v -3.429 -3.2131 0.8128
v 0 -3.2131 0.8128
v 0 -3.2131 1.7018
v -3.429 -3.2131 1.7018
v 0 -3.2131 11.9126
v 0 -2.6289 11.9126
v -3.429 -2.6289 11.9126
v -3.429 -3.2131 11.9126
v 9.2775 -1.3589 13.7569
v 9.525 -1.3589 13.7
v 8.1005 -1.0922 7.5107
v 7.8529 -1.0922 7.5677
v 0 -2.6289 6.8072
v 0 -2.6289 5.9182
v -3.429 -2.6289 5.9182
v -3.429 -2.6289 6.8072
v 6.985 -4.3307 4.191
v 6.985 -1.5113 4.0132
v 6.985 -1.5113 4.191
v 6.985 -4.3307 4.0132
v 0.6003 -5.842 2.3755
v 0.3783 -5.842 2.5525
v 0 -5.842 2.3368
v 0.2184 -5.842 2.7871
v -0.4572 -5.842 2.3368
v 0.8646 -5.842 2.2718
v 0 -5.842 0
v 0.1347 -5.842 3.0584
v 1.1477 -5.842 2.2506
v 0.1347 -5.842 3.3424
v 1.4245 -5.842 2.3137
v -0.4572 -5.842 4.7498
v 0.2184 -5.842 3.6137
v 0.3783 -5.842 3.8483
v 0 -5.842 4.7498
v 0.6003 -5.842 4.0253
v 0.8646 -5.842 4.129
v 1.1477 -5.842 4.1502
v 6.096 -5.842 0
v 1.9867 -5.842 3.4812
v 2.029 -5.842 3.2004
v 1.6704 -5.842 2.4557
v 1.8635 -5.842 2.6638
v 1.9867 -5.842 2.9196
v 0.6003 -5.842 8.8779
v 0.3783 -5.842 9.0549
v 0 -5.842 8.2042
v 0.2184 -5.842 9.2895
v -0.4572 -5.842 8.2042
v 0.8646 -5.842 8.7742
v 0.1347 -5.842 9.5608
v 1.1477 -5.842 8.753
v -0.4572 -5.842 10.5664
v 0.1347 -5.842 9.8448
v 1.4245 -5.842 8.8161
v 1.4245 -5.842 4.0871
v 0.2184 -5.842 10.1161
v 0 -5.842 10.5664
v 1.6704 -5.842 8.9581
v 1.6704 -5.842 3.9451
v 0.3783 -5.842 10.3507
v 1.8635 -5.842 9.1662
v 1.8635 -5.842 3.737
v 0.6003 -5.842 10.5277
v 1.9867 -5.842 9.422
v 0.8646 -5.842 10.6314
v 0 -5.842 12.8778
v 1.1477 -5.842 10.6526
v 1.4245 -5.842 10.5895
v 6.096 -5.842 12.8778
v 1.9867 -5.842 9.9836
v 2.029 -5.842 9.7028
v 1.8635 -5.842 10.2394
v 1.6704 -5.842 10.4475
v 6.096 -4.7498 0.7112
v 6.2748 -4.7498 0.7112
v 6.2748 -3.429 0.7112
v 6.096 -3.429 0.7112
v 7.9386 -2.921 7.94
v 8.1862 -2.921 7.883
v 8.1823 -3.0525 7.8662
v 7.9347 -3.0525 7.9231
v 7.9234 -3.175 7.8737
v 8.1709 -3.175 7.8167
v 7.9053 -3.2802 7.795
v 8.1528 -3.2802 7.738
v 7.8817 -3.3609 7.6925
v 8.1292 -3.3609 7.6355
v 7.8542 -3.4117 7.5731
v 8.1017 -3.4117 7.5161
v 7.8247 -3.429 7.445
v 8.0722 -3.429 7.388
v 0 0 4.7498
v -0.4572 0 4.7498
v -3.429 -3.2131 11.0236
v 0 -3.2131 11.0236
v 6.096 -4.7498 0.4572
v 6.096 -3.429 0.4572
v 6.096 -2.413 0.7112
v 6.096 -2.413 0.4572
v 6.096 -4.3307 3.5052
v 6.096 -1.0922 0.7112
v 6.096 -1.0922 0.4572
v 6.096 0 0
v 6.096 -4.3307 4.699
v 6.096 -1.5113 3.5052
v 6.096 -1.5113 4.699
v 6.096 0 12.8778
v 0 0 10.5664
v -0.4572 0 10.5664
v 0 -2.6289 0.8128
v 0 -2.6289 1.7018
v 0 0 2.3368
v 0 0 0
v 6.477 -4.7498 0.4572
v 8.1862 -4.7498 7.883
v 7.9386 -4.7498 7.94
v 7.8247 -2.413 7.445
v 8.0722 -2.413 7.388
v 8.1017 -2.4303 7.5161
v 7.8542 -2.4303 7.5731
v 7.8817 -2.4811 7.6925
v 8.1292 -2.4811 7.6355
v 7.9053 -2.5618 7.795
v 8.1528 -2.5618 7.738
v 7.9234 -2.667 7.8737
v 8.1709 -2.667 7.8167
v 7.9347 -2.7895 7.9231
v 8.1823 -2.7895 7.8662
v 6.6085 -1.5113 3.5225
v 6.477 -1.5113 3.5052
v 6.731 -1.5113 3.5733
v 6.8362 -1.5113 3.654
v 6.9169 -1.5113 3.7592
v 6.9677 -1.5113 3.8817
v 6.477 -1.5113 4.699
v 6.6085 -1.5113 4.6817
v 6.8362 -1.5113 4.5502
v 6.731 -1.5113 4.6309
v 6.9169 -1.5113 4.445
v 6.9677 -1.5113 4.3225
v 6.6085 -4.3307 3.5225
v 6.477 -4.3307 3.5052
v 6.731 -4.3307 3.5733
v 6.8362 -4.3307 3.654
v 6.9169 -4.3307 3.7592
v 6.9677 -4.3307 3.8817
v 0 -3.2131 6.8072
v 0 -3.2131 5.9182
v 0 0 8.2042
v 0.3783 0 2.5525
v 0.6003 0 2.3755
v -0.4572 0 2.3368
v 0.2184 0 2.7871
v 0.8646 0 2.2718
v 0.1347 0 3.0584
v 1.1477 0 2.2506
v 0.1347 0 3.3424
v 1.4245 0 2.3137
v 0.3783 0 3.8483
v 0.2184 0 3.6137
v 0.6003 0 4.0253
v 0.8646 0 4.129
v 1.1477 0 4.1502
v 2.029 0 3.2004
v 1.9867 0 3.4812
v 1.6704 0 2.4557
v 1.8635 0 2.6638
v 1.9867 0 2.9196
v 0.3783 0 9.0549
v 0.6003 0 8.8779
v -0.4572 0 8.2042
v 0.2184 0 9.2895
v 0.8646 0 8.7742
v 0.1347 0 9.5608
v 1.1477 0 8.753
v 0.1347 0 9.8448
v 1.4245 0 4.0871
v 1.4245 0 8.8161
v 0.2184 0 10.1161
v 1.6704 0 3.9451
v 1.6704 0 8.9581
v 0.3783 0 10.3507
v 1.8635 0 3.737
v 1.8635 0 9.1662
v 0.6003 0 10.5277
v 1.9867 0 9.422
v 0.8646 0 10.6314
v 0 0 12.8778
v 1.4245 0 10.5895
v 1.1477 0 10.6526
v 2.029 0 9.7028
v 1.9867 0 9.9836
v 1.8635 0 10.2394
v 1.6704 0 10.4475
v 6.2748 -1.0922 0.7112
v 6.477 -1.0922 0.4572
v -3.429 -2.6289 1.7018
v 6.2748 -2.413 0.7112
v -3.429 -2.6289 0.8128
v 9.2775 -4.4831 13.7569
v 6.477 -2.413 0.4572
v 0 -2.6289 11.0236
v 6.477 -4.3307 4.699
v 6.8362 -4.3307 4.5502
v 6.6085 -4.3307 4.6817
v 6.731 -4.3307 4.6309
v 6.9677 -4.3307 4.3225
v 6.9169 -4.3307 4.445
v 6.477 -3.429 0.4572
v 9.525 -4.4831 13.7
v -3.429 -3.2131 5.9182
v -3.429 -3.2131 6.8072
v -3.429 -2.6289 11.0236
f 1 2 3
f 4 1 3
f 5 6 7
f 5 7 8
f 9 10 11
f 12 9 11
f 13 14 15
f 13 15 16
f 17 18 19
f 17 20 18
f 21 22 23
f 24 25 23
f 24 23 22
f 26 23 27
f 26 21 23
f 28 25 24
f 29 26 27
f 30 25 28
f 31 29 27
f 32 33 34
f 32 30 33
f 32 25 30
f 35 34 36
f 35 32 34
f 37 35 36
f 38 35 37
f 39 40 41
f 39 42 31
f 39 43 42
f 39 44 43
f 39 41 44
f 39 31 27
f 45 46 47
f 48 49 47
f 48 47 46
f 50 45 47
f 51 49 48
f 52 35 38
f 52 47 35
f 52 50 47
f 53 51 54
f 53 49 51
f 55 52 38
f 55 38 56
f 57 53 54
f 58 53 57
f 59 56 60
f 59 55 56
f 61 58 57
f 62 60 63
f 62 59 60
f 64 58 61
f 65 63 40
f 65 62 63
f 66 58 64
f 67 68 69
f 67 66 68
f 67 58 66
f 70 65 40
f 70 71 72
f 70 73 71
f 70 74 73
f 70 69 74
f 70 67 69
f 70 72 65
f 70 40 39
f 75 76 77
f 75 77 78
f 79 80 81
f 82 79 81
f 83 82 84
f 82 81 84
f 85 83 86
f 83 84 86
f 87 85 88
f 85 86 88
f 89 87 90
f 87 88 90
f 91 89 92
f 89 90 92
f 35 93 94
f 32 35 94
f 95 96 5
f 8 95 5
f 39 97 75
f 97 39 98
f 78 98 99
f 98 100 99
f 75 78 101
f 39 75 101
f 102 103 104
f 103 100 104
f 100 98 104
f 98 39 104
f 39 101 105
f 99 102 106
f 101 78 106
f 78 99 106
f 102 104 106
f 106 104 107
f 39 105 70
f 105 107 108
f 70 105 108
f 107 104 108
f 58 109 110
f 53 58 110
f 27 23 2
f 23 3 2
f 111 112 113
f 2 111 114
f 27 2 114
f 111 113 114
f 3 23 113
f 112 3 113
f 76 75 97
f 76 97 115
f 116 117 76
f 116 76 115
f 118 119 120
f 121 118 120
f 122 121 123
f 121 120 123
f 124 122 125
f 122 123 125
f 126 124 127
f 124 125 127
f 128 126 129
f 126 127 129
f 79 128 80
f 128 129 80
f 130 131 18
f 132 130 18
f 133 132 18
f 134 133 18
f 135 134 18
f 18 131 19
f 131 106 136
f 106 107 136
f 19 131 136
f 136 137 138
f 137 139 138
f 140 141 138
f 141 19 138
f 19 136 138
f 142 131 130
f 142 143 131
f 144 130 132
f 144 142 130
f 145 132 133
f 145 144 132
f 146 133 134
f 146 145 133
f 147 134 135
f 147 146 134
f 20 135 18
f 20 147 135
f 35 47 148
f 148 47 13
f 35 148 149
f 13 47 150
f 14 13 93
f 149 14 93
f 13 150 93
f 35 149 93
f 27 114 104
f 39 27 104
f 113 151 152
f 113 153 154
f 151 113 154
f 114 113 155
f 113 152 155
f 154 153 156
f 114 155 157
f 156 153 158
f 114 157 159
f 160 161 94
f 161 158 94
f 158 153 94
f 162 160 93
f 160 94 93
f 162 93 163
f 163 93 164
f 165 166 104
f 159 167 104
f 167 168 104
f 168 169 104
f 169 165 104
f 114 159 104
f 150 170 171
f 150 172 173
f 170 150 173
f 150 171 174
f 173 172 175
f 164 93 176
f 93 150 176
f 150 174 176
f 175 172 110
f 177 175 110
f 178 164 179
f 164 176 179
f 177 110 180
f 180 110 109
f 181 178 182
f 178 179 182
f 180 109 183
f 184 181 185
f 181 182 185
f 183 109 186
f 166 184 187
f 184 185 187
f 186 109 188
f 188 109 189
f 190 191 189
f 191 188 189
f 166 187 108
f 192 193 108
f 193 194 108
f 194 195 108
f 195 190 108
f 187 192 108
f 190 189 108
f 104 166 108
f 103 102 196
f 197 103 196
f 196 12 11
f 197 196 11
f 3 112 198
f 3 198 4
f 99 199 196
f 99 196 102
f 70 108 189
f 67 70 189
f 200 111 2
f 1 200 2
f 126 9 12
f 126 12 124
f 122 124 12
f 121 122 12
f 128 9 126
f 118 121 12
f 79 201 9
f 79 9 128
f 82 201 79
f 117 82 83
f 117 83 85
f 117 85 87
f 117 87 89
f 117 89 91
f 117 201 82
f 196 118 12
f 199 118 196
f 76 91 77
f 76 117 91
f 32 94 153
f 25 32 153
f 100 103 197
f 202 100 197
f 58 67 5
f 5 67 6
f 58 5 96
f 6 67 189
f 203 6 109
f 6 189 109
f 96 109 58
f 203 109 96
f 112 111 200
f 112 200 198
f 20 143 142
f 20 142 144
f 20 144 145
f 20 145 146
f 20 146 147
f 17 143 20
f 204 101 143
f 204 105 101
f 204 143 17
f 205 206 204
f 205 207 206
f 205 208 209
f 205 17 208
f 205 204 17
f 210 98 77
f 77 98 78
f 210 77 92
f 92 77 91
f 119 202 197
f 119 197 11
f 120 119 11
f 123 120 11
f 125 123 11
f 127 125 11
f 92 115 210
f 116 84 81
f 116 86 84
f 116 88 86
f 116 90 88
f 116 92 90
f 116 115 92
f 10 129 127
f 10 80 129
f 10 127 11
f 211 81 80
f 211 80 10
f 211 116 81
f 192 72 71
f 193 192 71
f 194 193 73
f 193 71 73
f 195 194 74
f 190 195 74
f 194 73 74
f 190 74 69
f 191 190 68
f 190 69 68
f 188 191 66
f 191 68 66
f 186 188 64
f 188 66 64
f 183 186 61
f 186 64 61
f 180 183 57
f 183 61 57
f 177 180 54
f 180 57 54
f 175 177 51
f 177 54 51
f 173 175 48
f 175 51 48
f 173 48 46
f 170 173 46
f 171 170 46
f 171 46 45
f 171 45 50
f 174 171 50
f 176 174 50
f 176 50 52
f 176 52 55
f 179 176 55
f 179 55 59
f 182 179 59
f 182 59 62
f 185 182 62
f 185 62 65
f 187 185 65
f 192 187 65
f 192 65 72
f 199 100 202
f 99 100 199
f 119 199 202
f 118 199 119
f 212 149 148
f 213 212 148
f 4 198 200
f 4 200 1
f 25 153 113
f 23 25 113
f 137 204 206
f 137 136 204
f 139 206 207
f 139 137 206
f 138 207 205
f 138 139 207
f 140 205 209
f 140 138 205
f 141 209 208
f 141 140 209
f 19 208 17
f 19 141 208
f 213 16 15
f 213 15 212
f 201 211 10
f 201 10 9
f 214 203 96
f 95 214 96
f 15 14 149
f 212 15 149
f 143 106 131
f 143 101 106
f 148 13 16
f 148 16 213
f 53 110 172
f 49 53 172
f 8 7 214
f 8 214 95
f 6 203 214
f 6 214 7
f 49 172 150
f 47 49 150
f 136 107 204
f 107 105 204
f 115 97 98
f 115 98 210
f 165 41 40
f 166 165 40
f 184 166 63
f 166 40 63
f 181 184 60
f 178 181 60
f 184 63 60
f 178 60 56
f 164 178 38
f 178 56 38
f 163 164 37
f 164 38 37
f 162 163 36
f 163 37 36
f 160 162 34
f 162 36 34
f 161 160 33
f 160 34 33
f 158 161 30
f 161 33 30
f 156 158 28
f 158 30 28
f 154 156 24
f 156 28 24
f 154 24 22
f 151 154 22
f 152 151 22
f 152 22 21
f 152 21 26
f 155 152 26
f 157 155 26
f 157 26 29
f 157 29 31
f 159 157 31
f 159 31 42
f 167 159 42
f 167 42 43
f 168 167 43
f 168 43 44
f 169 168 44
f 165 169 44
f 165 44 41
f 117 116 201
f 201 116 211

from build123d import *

# Parameters (mm, degrees)
F1_DEPTH  = 5.842
F2_R      = 0.9525
F3_DEPTH  = 25.4
F5_W      = 0.889
F5_H      = 1.1938
F6_DEPTH  = 1.4097
F7_R      = 0.508
F9_DEPTH  = 1.8288
F11_DEPTH = 0.254
F12_W     = 1.016
F12_H     = 0.936952
F13_DEPTH = 25.4
F14_W     = 0.5842
F14_H     = 0.889
F15_DEPTH = 3.429


with BuildPart() as f1:
    # F0 (on Front) → F1 (new body)
    with BuildSketch(Plane.XZ):
        Polygon((0, 2.3368), (0, 0), (6.096, 0), (6.096, 12.8778), (0, 12.8778), (0, 10.5664), (-0.4572, 10.5664), (-0.4572, 8.2042), (0, 8.2042), (0, 4.7498), (-0.4572, 4.7498), (-0.4572, 2.3368), align=None)
    extrude(amount=F1_DEPTH)

    # F2 (on face) → F3 (cut)
    with BuildSketch(Plane.XZ.offset(5.842)):
        with Locations((1.076548, 9.7028)):
            Circle(F2_R)
        with Locations((1.076548, 3.2004)):
            Circle(F2_R)
    extrude(amount=-F3_DEPTH, mode=Mode.SUBTRACT)

    # F5 (on offset) → F6 (join, symmetric)
    with BuildSketch(Plane.XZ.offset(2.921)):
        with Locations((6.5405, 4.1021)):
            Rectangle(F5_W, F5_H)
    extrude(amount=F6_DEPTH, both=True)

    # F7
    f7_edges = [f1.edges().sort_by_distance(p)[0] for p in [
        (6.985, -2.921, 4.699),
        (6.985, -2.921, 3.5052),
    ]]
    fillet(f7_edges, radius=F7_R)

    # F8 (on offset) → F9 (join, symmetric)
    with BuildSketch(Plane.XZ.offset(2.921)):
        Polygon((6.096, 0.7112), (6.096, 0.4572), (6.477, 0.4572), (9.525, 13.699957), (9.277472, 13.756929), (6.274821, 0.7112), align=None)
    extrude(amount=F9_DEPTH, both=True)

    # F10 (on face) → F11 (cut)
    with BuildSketch(Plane(origin=(6.051205, 0, -1.392767), x_dir=(0, 1, 0), z_dir=(0.97452, 0, -0.224299))):
        Polygon((-4.7498, 9.518336), (-4.4831, 15.487336), (-4.7498, 15.487336), align=None)
        Polygon((-1.0922, 9.136269), (-1.0922, 15.487336), (-1.3589, 15.487336), align=None)
        with BuildLine():
            Line((-3.429, 9.010336), (-3.429, 1.898336))
            Line((-3.429, 1.898336), (-2.413, 1.898336))
            Line((-2.413, 1.898336), (-2.413, 9.010336))
            ThreePointArc((-2.413, 9.010336), (-2.56179, 9.369546), (-2.921, 9.518336))
            ThreePointArc((-2.921, 9.518336), (-3.28021, 9.369546), (-3.429, 9.010336))
        make_face()
    extrude(amount=-F11_DEPTH, mode=Mode.SUBTRACT)

    # F12 (on face) → F13 (cut)
    with BuildSketch(Plane.YZ.offset(6.096)):
        with Locations((-2.921, 0.633924)):
            Rectangle(F12_W, F12_H)
    extrude(amount=F13_DEPTH, mode=Mode.SUBTRACT)

    # F14 (on face) → F15 (join)
    with BuildSketch(Plane(origin=(0, 0, 0), x_dir=(0, -1, 0), z_dir=(-1, 0, 0))):
        with Locations((2.921, 6.3627)):
            Rectangle(F14_W, F14_H)
        with Locations((2.921, 11.4681)):
            Rectangle(F14_W, F14_H)
        with Locations((2.921, 1.2573)):
            Rectangle(F14_W, F14_H)
    extrude(amount=F15_DEPTH)


solid = f1.part
